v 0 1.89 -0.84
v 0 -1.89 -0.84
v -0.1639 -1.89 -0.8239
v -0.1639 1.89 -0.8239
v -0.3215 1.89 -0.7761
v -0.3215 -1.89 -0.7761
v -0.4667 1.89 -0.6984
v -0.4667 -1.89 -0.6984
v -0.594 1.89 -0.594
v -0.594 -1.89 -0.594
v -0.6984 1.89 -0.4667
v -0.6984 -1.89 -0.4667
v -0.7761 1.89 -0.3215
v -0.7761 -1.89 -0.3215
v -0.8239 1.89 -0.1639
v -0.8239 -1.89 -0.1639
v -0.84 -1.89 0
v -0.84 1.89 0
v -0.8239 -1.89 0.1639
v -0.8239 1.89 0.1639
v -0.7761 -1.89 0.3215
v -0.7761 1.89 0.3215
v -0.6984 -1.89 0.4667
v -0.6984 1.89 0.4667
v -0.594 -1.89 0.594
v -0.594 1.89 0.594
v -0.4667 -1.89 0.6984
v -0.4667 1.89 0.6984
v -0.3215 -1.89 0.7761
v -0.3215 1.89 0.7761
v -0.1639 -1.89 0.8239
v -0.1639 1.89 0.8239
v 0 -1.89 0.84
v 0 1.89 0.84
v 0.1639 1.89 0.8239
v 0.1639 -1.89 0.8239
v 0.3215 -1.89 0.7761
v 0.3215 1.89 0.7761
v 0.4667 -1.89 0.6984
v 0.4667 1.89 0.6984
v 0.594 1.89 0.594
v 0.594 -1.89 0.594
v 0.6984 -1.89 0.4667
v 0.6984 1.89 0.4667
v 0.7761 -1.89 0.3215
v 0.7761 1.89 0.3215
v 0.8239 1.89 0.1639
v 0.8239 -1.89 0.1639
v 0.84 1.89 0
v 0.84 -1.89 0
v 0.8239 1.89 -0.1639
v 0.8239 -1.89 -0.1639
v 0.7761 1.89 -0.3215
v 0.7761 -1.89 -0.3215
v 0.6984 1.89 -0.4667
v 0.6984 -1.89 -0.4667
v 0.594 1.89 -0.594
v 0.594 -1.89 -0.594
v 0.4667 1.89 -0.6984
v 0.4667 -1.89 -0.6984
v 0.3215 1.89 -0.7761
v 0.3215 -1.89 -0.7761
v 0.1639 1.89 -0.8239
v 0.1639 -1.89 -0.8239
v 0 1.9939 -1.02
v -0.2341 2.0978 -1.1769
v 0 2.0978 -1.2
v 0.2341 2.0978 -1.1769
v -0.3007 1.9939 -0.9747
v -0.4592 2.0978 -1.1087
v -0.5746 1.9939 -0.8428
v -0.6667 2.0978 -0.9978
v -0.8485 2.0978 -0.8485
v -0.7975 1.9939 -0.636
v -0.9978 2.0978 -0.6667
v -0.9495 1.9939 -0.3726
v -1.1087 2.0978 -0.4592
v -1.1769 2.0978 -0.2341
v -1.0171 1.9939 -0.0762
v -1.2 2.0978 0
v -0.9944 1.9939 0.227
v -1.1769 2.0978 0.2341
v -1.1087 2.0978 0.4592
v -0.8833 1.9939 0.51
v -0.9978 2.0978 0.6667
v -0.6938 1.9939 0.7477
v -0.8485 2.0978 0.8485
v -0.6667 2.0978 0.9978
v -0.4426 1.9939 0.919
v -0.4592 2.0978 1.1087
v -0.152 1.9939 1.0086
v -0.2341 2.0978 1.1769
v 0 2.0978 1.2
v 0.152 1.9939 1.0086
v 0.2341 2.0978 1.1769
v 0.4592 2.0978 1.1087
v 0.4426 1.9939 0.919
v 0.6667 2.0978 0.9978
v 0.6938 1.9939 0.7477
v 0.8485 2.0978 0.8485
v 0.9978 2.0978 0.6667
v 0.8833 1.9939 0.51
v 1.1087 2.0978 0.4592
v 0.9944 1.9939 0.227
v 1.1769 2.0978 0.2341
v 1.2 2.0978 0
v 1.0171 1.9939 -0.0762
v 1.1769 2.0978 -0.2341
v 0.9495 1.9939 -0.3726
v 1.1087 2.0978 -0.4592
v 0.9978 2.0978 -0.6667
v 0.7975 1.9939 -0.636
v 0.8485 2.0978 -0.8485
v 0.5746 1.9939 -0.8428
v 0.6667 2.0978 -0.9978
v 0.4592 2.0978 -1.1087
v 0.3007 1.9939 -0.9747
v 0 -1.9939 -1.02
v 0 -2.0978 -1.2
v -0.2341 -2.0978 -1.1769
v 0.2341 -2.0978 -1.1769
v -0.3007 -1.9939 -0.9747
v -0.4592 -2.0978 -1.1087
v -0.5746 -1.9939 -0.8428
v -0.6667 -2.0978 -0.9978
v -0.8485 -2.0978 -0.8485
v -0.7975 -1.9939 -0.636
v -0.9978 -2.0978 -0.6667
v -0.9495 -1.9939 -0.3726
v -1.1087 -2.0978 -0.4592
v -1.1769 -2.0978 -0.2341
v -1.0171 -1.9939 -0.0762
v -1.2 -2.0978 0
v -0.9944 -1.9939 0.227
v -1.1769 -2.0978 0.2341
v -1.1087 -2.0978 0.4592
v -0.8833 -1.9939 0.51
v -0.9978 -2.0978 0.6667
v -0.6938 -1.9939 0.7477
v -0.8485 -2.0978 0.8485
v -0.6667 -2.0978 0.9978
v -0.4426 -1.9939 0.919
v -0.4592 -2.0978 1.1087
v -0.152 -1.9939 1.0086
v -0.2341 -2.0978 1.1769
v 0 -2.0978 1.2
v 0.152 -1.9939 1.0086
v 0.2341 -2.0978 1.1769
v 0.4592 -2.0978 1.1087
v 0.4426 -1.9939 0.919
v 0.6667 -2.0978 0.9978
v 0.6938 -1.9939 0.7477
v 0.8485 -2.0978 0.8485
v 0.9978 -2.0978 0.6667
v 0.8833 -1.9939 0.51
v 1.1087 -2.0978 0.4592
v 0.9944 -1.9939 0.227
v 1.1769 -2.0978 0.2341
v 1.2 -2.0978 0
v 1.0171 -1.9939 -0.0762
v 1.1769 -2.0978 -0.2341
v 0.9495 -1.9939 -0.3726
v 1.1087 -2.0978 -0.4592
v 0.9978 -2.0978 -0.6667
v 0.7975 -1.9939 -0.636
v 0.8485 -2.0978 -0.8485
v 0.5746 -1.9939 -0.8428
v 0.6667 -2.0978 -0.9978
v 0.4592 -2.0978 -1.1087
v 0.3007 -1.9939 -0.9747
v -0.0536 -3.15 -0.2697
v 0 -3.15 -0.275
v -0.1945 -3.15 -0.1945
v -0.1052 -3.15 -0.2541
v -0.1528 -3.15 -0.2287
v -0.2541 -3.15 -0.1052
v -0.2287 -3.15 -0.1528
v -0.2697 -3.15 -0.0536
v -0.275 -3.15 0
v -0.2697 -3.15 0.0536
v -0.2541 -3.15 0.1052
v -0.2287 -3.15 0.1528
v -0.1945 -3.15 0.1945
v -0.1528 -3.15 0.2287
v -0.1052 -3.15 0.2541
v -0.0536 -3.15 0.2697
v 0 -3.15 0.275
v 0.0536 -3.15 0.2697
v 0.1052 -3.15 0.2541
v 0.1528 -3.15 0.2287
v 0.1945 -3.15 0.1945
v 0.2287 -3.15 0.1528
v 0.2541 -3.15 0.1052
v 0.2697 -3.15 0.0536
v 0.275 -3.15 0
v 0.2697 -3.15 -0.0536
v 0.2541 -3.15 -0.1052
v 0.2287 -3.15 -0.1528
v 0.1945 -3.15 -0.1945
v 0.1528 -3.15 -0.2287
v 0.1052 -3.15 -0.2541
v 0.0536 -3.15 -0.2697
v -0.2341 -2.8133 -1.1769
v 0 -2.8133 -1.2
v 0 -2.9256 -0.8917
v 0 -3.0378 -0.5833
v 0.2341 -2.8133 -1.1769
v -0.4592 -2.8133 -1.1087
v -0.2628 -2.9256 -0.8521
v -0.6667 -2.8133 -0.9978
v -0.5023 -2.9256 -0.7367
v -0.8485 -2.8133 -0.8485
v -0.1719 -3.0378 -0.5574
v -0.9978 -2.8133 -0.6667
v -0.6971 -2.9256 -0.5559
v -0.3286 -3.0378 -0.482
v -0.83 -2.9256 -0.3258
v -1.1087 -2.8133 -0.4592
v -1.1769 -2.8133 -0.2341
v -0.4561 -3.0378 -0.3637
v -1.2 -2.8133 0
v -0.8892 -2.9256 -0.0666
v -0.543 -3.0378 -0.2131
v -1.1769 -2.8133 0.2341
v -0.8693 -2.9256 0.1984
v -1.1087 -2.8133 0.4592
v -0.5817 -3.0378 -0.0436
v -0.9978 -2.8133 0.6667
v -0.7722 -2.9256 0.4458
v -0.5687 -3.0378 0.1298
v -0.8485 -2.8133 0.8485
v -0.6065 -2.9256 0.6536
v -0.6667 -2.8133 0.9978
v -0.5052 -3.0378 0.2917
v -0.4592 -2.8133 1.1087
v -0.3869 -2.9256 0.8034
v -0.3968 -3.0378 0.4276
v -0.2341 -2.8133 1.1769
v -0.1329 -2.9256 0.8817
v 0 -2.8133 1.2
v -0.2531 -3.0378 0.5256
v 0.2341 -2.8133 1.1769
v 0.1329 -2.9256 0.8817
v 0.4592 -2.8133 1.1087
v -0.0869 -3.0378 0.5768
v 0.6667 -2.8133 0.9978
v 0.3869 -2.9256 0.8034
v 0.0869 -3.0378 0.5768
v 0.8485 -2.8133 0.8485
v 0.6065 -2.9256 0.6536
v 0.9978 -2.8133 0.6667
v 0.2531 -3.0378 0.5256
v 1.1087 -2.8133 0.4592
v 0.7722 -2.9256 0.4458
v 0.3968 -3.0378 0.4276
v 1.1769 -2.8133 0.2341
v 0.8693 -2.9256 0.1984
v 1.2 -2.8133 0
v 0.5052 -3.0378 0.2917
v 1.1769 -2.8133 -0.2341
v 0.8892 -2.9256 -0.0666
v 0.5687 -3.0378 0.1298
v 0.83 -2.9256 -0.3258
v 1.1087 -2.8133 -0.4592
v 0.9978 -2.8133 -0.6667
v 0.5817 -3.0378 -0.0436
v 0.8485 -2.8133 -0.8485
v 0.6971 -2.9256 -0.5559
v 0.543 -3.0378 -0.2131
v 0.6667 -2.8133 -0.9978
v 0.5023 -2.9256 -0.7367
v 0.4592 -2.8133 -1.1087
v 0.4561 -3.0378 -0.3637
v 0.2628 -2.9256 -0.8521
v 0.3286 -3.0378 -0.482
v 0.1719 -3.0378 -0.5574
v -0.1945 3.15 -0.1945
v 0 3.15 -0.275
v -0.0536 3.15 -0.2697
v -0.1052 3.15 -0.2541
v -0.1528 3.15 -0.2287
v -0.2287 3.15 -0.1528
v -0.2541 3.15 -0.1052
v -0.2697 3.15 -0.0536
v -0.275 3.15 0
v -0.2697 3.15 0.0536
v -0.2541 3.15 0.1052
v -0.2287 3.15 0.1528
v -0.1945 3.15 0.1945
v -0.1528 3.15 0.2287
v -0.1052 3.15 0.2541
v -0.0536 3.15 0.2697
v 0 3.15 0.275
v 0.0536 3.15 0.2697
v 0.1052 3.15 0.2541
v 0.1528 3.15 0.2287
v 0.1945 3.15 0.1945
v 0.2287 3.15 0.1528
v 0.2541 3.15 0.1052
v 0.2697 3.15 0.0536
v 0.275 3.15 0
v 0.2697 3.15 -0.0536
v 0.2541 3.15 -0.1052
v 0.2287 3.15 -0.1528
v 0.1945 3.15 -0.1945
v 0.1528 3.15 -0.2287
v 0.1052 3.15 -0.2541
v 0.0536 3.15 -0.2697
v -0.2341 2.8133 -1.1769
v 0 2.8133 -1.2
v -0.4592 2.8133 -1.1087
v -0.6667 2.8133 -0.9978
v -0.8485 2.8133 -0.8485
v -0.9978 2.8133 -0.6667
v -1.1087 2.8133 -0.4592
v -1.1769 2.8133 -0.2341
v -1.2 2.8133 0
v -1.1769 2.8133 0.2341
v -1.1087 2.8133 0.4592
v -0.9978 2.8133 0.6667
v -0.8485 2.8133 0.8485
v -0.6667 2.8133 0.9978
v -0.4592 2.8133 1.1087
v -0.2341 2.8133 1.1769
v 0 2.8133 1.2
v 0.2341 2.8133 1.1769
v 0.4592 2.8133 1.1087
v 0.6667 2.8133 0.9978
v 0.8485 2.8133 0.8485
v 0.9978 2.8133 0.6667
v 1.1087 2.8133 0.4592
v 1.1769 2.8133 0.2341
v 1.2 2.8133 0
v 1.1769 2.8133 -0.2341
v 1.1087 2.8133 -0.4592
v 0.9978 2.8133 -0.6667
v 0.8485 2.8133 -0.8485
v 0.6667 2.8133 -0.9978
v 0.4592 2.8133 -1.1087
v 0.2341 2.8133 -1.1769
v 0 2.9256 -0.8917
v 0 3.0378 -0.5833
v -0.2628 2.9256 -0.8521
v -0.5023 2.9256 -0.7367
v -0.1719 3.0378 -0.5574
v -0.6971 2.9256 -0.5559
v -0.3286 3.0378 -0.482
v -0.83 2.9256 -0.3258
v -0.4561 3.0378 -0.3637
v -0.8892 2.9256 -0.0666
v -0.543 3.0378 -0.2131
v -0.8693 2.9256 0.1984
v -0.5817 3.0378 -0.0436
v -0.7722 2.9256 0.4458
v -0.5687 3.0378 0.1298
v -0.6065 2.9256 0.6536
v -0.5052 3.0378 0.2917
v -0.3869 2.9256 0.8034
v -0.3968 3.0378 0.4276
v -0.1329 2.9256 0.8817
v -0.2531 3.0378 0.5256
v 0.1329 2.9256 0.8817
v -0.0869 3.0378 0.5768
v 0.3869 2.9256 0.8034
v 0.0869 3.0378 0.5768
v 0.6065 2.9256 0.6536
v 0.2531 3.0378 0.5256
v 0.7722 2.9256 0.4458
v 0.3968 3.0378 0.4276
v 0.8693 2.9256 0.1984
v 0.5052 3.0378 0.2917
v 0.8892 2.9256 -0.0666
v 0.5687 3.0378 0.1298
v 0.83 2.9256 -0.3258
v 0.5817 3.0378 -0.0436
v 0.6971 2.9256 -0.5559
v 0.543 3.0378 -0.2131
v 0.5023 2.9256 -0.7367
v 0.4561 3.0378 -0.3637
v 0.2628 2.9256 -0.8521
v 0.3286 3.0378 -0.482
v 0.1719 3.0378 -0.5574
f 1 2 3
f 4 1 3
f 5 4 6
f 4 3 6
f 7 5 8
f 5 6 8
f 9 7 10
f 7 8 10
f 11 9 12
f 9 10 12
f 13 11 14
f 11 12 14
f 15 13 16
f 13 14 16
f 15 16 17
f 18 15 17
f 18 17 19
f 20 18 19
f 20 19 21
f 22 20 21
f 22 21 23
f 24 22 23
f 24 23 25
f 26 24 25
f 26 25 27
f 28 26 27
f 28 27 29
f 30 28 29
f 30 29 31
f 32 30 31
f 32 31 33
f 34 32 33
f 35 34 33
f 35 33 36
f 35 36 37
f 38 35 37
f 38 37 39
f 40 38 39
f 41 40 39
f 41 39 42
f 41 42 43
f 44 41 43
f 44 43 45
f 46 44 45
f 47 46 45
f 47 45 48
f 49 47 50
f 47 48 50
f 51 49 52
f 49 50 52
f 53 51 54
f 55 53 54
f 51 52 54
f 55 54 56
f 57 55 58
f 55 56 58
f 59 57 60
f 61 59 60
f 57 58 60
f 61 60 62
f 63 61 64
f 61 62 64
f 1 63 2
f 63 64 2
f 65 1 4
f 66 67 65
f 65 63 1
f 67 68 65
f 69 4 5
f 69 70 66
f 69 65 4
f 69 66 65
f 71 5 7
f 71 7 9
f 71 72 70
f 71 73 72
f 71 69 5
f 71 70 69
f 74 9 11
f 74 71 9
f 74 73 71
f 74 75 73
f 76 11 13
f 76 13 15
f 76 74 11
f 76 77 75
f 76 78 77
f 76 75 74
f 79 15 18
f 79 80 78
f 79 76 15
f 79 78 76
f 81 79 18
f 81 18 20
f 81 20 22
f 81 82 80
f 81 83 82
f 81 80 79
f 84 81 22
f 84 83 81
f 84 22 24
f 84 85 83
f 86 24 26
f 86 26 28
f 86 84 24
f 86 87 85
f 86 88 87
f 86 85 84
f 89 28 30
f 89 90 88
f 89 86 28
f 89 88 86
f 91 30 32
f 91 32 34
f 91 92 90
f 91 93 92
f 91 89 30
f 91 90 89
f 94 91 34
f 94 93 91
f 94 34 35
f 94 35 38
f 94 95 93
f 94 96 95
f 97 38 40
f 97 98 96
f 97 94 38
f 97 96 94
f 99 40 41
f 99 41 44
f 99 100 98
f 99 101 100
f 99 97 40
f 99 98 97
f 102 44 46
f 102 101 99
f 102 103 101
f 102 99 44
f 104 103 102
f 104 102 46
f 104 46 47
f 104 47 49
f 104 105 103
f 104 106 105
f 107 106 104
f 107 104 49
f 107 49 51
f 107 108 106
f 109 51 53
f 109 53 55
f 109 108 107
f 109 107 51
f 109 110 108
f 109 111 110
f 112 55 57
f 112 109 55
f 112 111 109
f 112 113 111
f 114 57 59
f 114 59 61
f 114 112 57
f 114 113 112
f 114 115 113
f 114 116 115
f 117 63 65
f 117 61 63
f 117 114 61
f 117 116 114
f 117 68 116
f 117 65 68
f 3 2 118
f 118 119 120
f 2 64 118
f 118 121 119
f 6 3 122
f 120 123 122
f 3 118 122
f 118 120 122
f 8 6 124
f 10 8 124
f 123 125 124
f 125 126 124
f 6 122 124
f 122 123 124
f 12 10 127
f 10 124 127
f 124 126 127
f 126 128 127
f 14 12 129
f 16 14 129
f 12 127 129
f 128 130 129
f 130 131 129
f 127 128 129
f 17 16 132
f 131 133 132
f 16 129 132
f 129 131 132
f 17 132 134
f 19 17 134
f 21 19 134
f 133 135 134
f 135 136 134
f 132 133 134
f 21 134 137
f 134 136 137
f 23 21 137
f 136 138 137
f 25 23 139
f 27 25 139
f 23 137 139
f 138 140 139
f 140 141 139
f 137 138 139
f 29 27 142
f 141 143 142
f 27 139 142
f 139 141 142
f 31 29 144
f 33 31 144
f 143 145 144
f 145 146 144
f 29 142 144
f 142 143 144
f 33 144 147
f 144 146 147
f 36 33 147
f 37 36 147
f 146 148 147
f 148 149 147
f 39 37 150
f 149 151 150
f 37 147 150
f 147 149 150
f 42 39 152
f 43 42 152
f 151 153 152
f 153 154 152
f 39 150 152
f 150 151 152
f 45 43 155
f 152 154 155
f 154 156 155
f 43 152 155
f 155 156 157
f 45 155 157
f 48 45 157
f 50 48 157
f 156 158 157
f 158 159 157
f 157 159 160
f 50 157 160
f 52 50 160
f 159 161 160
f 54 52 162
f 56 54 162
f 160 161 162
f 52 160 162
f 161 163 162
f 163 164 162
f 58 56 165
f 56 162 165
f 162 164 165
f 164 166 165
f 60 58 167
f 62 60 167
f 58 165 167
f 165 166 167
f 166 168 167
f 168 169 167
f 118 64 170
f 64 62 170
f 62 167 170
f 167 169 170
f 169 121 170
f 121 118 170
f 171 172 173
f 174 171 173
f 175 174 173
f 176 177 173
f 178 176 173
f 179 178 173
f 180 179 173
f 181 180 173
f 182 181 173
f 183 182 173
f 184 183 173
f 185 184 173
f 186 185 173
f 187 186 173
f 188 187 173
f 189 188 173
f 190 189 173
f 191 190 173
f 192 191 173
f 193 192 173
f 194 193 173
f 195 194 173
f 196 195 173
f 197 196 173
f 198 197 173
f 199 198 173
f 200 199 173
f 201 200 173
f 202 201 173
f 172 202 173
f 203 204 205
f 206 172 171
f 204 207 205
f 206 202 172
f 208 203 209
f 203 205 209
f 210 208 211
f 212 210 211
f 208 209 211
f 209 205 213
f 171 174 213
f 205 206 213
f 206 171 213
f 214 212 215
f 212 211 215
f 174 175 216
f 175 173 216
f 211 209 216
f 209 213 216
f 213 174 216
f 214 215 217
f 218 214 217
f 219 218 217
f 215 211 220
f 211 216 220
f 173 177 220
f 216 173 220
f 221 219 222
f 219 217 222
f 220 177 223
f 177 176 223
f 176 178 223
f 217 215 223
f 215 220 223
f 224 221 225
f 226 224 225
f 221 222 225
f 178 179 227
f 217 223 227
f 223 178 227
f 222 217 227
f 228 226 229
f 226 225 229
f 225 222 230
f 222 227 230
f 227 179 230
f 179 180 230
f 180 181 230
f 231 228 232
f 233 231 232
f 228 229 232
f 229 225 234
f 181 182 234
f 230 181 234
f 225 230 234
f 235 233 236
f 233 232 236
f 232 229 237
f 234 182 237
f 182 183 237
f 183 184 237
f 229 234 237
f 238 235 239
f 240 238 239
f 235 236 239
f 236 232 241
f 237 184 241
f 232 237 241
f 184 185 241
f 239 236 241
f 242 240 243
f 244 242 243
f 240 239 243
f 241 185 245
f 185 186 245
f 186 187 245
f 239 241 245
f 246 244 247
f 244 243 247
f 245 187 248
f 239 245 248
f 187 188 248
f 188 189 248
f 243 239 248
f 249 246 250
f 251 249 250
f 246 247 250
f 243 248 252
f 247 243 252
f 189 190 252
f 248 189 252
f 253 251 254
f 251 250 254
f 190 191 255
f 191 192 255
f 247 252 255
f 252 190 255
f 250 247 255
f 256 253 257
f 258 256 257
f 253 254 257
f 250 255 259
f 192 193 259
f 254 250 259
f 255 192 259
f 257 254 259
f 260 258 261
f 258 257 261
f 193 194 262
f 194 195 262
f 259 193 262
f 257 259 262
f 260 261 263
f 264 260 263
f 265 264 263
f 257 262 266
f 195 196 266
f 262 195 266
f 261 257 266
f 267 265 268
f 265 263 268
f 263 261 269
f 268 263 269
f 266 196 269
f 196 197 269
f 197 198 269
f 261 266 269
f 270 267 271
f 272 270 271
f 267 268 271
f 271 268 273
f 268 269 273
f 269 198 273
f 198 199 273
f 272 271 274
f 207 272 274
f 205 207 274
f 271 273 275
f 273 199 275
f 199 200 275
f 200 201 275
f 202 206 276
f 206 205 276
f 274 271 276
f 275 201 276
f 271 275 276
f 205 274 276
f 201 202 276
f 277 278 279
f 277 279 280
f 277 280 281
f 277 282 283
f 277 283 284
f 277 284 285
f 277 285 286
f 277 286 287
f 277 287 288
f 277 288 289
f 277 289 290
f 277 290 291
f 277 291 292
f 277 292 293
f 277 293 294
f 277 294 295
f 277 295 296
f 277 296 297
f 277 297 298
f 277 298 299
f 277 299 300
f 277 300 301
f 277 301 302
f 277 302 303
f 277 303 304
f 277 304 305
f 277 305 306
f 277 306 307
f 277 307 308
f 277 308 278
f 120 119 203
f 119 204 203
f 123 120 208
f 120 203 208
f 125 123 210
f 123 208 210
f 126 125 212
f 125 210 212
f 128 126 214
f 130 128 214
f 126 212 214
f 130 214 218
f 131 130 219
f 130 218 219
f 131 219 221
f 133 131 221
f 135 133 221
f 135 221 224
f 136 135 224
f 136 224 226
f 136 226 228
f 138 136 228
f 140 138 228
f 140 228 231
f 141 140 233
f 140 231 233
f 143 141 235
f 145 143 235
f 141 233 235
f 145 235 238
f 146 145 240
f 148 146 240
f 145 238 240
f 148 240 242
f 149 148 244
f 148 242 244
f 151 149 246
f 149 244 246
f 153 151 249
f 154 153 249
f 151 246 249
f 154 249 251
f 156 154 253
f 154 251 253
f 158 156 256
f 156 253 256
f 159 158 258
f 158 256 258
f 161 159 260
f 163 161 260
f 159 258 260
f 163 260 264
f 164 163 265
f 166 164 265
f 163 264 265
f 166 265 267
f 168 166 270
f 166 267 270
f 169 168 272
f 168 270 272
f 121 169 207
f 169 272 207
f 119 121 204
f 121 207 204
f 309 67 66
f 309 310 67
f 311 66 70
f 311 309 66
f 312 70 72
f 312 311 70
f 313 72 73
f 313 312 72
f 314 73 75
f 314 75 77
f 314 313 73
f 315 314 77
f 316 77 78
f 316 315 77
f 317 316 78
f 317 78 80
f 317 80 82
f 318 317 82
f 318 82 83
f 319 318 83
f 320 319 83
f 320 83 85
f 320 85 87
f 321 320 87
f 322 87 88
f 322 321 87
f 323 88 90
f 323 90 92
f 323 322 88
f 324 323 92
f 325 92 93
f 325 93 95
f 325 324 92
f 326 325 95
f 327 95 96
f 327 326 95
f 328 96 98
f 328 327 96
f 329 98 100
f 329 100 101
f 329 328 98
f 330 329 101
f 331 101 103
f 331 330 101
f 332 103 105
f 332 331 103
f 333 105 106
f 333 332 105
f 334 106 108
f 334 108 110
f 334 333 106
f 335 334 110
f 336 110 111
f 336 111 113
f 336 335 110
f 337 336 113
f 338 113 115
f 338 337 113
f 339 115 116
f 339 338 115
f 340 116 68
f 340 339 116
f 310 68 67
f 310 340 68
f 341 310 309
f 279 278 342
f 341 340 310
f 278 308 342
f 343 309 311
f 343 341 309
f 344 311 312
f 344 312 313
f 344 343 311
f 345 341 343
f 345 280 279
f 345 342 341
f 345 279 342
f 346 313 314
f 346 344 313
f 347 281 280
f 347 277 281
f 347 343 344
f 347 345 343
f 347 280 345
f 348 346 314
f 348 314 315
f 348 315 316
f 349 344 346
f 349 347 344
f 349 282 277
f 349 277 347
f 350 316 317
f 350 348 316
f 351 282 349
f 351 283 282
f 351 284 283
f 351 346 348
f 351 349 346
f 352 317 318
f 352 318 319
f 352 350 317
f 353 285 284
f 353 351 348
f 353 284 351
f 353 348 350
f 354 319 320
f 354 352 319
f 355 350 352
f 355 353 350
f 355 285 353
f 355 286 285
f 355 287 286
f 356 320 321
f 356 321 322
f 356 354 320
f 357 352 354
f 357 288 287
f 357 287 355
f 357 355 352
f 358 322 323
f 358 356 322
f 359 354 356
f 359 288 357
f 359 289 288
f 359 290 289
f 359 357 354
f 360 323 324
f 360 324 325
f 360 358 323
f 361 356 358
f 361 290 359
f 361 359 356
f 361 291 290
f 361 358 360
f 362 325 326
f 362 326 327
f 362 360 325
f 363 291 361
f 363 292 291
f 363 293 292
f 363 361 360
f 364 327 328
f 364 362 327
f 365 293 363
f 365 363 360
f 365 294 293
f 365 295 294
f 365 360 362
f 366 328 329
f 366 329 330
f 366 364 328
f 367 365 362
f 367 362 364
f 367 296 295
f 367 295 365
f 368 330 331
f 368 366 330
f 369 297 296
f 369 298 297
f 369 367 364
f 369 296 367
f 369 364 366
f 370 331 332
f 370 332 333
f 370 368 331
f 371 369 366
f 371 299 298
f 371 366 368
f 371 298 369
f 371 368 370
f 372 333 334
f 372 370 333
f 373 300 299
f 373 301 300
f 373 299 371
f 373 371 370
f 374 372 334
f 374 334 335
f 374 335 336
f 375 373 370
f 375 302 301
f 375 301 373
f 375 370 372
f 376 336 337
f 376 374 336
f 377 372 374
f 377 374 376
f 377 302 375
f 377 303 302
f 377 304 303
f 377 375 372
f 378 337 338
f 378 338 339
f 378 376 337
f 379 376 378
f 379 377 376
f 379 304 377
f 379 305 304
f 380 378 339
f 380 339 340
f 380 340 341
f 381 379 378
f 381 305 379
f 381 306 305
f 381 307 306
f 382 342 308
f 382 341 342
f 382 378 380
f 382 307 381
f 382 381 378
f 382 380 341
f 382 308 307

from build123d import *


with BuildPart() as part:
    # Sketch → Revolution (revolve)
    with BuildSketch(Plane(origin=(0, 0, 0), x_dir=(0, -1, 0), z_dir=(1, 0, 0))):
        Polygon((0, 0.84), (-1.89, 0.84), (-2.097846, 1.2), (-2.813328, 1.2), (-3.15, 0.275), (-3.15, 0), (0, 0), align=None)
    revolution = revolve(axis=Axis((0, 0, 0), (0, 1, 0)))

    # Mirrored: Revolution across Sketch V_Axis
    add(revolution.mirror(Plane.XZ))


solid = part.part
